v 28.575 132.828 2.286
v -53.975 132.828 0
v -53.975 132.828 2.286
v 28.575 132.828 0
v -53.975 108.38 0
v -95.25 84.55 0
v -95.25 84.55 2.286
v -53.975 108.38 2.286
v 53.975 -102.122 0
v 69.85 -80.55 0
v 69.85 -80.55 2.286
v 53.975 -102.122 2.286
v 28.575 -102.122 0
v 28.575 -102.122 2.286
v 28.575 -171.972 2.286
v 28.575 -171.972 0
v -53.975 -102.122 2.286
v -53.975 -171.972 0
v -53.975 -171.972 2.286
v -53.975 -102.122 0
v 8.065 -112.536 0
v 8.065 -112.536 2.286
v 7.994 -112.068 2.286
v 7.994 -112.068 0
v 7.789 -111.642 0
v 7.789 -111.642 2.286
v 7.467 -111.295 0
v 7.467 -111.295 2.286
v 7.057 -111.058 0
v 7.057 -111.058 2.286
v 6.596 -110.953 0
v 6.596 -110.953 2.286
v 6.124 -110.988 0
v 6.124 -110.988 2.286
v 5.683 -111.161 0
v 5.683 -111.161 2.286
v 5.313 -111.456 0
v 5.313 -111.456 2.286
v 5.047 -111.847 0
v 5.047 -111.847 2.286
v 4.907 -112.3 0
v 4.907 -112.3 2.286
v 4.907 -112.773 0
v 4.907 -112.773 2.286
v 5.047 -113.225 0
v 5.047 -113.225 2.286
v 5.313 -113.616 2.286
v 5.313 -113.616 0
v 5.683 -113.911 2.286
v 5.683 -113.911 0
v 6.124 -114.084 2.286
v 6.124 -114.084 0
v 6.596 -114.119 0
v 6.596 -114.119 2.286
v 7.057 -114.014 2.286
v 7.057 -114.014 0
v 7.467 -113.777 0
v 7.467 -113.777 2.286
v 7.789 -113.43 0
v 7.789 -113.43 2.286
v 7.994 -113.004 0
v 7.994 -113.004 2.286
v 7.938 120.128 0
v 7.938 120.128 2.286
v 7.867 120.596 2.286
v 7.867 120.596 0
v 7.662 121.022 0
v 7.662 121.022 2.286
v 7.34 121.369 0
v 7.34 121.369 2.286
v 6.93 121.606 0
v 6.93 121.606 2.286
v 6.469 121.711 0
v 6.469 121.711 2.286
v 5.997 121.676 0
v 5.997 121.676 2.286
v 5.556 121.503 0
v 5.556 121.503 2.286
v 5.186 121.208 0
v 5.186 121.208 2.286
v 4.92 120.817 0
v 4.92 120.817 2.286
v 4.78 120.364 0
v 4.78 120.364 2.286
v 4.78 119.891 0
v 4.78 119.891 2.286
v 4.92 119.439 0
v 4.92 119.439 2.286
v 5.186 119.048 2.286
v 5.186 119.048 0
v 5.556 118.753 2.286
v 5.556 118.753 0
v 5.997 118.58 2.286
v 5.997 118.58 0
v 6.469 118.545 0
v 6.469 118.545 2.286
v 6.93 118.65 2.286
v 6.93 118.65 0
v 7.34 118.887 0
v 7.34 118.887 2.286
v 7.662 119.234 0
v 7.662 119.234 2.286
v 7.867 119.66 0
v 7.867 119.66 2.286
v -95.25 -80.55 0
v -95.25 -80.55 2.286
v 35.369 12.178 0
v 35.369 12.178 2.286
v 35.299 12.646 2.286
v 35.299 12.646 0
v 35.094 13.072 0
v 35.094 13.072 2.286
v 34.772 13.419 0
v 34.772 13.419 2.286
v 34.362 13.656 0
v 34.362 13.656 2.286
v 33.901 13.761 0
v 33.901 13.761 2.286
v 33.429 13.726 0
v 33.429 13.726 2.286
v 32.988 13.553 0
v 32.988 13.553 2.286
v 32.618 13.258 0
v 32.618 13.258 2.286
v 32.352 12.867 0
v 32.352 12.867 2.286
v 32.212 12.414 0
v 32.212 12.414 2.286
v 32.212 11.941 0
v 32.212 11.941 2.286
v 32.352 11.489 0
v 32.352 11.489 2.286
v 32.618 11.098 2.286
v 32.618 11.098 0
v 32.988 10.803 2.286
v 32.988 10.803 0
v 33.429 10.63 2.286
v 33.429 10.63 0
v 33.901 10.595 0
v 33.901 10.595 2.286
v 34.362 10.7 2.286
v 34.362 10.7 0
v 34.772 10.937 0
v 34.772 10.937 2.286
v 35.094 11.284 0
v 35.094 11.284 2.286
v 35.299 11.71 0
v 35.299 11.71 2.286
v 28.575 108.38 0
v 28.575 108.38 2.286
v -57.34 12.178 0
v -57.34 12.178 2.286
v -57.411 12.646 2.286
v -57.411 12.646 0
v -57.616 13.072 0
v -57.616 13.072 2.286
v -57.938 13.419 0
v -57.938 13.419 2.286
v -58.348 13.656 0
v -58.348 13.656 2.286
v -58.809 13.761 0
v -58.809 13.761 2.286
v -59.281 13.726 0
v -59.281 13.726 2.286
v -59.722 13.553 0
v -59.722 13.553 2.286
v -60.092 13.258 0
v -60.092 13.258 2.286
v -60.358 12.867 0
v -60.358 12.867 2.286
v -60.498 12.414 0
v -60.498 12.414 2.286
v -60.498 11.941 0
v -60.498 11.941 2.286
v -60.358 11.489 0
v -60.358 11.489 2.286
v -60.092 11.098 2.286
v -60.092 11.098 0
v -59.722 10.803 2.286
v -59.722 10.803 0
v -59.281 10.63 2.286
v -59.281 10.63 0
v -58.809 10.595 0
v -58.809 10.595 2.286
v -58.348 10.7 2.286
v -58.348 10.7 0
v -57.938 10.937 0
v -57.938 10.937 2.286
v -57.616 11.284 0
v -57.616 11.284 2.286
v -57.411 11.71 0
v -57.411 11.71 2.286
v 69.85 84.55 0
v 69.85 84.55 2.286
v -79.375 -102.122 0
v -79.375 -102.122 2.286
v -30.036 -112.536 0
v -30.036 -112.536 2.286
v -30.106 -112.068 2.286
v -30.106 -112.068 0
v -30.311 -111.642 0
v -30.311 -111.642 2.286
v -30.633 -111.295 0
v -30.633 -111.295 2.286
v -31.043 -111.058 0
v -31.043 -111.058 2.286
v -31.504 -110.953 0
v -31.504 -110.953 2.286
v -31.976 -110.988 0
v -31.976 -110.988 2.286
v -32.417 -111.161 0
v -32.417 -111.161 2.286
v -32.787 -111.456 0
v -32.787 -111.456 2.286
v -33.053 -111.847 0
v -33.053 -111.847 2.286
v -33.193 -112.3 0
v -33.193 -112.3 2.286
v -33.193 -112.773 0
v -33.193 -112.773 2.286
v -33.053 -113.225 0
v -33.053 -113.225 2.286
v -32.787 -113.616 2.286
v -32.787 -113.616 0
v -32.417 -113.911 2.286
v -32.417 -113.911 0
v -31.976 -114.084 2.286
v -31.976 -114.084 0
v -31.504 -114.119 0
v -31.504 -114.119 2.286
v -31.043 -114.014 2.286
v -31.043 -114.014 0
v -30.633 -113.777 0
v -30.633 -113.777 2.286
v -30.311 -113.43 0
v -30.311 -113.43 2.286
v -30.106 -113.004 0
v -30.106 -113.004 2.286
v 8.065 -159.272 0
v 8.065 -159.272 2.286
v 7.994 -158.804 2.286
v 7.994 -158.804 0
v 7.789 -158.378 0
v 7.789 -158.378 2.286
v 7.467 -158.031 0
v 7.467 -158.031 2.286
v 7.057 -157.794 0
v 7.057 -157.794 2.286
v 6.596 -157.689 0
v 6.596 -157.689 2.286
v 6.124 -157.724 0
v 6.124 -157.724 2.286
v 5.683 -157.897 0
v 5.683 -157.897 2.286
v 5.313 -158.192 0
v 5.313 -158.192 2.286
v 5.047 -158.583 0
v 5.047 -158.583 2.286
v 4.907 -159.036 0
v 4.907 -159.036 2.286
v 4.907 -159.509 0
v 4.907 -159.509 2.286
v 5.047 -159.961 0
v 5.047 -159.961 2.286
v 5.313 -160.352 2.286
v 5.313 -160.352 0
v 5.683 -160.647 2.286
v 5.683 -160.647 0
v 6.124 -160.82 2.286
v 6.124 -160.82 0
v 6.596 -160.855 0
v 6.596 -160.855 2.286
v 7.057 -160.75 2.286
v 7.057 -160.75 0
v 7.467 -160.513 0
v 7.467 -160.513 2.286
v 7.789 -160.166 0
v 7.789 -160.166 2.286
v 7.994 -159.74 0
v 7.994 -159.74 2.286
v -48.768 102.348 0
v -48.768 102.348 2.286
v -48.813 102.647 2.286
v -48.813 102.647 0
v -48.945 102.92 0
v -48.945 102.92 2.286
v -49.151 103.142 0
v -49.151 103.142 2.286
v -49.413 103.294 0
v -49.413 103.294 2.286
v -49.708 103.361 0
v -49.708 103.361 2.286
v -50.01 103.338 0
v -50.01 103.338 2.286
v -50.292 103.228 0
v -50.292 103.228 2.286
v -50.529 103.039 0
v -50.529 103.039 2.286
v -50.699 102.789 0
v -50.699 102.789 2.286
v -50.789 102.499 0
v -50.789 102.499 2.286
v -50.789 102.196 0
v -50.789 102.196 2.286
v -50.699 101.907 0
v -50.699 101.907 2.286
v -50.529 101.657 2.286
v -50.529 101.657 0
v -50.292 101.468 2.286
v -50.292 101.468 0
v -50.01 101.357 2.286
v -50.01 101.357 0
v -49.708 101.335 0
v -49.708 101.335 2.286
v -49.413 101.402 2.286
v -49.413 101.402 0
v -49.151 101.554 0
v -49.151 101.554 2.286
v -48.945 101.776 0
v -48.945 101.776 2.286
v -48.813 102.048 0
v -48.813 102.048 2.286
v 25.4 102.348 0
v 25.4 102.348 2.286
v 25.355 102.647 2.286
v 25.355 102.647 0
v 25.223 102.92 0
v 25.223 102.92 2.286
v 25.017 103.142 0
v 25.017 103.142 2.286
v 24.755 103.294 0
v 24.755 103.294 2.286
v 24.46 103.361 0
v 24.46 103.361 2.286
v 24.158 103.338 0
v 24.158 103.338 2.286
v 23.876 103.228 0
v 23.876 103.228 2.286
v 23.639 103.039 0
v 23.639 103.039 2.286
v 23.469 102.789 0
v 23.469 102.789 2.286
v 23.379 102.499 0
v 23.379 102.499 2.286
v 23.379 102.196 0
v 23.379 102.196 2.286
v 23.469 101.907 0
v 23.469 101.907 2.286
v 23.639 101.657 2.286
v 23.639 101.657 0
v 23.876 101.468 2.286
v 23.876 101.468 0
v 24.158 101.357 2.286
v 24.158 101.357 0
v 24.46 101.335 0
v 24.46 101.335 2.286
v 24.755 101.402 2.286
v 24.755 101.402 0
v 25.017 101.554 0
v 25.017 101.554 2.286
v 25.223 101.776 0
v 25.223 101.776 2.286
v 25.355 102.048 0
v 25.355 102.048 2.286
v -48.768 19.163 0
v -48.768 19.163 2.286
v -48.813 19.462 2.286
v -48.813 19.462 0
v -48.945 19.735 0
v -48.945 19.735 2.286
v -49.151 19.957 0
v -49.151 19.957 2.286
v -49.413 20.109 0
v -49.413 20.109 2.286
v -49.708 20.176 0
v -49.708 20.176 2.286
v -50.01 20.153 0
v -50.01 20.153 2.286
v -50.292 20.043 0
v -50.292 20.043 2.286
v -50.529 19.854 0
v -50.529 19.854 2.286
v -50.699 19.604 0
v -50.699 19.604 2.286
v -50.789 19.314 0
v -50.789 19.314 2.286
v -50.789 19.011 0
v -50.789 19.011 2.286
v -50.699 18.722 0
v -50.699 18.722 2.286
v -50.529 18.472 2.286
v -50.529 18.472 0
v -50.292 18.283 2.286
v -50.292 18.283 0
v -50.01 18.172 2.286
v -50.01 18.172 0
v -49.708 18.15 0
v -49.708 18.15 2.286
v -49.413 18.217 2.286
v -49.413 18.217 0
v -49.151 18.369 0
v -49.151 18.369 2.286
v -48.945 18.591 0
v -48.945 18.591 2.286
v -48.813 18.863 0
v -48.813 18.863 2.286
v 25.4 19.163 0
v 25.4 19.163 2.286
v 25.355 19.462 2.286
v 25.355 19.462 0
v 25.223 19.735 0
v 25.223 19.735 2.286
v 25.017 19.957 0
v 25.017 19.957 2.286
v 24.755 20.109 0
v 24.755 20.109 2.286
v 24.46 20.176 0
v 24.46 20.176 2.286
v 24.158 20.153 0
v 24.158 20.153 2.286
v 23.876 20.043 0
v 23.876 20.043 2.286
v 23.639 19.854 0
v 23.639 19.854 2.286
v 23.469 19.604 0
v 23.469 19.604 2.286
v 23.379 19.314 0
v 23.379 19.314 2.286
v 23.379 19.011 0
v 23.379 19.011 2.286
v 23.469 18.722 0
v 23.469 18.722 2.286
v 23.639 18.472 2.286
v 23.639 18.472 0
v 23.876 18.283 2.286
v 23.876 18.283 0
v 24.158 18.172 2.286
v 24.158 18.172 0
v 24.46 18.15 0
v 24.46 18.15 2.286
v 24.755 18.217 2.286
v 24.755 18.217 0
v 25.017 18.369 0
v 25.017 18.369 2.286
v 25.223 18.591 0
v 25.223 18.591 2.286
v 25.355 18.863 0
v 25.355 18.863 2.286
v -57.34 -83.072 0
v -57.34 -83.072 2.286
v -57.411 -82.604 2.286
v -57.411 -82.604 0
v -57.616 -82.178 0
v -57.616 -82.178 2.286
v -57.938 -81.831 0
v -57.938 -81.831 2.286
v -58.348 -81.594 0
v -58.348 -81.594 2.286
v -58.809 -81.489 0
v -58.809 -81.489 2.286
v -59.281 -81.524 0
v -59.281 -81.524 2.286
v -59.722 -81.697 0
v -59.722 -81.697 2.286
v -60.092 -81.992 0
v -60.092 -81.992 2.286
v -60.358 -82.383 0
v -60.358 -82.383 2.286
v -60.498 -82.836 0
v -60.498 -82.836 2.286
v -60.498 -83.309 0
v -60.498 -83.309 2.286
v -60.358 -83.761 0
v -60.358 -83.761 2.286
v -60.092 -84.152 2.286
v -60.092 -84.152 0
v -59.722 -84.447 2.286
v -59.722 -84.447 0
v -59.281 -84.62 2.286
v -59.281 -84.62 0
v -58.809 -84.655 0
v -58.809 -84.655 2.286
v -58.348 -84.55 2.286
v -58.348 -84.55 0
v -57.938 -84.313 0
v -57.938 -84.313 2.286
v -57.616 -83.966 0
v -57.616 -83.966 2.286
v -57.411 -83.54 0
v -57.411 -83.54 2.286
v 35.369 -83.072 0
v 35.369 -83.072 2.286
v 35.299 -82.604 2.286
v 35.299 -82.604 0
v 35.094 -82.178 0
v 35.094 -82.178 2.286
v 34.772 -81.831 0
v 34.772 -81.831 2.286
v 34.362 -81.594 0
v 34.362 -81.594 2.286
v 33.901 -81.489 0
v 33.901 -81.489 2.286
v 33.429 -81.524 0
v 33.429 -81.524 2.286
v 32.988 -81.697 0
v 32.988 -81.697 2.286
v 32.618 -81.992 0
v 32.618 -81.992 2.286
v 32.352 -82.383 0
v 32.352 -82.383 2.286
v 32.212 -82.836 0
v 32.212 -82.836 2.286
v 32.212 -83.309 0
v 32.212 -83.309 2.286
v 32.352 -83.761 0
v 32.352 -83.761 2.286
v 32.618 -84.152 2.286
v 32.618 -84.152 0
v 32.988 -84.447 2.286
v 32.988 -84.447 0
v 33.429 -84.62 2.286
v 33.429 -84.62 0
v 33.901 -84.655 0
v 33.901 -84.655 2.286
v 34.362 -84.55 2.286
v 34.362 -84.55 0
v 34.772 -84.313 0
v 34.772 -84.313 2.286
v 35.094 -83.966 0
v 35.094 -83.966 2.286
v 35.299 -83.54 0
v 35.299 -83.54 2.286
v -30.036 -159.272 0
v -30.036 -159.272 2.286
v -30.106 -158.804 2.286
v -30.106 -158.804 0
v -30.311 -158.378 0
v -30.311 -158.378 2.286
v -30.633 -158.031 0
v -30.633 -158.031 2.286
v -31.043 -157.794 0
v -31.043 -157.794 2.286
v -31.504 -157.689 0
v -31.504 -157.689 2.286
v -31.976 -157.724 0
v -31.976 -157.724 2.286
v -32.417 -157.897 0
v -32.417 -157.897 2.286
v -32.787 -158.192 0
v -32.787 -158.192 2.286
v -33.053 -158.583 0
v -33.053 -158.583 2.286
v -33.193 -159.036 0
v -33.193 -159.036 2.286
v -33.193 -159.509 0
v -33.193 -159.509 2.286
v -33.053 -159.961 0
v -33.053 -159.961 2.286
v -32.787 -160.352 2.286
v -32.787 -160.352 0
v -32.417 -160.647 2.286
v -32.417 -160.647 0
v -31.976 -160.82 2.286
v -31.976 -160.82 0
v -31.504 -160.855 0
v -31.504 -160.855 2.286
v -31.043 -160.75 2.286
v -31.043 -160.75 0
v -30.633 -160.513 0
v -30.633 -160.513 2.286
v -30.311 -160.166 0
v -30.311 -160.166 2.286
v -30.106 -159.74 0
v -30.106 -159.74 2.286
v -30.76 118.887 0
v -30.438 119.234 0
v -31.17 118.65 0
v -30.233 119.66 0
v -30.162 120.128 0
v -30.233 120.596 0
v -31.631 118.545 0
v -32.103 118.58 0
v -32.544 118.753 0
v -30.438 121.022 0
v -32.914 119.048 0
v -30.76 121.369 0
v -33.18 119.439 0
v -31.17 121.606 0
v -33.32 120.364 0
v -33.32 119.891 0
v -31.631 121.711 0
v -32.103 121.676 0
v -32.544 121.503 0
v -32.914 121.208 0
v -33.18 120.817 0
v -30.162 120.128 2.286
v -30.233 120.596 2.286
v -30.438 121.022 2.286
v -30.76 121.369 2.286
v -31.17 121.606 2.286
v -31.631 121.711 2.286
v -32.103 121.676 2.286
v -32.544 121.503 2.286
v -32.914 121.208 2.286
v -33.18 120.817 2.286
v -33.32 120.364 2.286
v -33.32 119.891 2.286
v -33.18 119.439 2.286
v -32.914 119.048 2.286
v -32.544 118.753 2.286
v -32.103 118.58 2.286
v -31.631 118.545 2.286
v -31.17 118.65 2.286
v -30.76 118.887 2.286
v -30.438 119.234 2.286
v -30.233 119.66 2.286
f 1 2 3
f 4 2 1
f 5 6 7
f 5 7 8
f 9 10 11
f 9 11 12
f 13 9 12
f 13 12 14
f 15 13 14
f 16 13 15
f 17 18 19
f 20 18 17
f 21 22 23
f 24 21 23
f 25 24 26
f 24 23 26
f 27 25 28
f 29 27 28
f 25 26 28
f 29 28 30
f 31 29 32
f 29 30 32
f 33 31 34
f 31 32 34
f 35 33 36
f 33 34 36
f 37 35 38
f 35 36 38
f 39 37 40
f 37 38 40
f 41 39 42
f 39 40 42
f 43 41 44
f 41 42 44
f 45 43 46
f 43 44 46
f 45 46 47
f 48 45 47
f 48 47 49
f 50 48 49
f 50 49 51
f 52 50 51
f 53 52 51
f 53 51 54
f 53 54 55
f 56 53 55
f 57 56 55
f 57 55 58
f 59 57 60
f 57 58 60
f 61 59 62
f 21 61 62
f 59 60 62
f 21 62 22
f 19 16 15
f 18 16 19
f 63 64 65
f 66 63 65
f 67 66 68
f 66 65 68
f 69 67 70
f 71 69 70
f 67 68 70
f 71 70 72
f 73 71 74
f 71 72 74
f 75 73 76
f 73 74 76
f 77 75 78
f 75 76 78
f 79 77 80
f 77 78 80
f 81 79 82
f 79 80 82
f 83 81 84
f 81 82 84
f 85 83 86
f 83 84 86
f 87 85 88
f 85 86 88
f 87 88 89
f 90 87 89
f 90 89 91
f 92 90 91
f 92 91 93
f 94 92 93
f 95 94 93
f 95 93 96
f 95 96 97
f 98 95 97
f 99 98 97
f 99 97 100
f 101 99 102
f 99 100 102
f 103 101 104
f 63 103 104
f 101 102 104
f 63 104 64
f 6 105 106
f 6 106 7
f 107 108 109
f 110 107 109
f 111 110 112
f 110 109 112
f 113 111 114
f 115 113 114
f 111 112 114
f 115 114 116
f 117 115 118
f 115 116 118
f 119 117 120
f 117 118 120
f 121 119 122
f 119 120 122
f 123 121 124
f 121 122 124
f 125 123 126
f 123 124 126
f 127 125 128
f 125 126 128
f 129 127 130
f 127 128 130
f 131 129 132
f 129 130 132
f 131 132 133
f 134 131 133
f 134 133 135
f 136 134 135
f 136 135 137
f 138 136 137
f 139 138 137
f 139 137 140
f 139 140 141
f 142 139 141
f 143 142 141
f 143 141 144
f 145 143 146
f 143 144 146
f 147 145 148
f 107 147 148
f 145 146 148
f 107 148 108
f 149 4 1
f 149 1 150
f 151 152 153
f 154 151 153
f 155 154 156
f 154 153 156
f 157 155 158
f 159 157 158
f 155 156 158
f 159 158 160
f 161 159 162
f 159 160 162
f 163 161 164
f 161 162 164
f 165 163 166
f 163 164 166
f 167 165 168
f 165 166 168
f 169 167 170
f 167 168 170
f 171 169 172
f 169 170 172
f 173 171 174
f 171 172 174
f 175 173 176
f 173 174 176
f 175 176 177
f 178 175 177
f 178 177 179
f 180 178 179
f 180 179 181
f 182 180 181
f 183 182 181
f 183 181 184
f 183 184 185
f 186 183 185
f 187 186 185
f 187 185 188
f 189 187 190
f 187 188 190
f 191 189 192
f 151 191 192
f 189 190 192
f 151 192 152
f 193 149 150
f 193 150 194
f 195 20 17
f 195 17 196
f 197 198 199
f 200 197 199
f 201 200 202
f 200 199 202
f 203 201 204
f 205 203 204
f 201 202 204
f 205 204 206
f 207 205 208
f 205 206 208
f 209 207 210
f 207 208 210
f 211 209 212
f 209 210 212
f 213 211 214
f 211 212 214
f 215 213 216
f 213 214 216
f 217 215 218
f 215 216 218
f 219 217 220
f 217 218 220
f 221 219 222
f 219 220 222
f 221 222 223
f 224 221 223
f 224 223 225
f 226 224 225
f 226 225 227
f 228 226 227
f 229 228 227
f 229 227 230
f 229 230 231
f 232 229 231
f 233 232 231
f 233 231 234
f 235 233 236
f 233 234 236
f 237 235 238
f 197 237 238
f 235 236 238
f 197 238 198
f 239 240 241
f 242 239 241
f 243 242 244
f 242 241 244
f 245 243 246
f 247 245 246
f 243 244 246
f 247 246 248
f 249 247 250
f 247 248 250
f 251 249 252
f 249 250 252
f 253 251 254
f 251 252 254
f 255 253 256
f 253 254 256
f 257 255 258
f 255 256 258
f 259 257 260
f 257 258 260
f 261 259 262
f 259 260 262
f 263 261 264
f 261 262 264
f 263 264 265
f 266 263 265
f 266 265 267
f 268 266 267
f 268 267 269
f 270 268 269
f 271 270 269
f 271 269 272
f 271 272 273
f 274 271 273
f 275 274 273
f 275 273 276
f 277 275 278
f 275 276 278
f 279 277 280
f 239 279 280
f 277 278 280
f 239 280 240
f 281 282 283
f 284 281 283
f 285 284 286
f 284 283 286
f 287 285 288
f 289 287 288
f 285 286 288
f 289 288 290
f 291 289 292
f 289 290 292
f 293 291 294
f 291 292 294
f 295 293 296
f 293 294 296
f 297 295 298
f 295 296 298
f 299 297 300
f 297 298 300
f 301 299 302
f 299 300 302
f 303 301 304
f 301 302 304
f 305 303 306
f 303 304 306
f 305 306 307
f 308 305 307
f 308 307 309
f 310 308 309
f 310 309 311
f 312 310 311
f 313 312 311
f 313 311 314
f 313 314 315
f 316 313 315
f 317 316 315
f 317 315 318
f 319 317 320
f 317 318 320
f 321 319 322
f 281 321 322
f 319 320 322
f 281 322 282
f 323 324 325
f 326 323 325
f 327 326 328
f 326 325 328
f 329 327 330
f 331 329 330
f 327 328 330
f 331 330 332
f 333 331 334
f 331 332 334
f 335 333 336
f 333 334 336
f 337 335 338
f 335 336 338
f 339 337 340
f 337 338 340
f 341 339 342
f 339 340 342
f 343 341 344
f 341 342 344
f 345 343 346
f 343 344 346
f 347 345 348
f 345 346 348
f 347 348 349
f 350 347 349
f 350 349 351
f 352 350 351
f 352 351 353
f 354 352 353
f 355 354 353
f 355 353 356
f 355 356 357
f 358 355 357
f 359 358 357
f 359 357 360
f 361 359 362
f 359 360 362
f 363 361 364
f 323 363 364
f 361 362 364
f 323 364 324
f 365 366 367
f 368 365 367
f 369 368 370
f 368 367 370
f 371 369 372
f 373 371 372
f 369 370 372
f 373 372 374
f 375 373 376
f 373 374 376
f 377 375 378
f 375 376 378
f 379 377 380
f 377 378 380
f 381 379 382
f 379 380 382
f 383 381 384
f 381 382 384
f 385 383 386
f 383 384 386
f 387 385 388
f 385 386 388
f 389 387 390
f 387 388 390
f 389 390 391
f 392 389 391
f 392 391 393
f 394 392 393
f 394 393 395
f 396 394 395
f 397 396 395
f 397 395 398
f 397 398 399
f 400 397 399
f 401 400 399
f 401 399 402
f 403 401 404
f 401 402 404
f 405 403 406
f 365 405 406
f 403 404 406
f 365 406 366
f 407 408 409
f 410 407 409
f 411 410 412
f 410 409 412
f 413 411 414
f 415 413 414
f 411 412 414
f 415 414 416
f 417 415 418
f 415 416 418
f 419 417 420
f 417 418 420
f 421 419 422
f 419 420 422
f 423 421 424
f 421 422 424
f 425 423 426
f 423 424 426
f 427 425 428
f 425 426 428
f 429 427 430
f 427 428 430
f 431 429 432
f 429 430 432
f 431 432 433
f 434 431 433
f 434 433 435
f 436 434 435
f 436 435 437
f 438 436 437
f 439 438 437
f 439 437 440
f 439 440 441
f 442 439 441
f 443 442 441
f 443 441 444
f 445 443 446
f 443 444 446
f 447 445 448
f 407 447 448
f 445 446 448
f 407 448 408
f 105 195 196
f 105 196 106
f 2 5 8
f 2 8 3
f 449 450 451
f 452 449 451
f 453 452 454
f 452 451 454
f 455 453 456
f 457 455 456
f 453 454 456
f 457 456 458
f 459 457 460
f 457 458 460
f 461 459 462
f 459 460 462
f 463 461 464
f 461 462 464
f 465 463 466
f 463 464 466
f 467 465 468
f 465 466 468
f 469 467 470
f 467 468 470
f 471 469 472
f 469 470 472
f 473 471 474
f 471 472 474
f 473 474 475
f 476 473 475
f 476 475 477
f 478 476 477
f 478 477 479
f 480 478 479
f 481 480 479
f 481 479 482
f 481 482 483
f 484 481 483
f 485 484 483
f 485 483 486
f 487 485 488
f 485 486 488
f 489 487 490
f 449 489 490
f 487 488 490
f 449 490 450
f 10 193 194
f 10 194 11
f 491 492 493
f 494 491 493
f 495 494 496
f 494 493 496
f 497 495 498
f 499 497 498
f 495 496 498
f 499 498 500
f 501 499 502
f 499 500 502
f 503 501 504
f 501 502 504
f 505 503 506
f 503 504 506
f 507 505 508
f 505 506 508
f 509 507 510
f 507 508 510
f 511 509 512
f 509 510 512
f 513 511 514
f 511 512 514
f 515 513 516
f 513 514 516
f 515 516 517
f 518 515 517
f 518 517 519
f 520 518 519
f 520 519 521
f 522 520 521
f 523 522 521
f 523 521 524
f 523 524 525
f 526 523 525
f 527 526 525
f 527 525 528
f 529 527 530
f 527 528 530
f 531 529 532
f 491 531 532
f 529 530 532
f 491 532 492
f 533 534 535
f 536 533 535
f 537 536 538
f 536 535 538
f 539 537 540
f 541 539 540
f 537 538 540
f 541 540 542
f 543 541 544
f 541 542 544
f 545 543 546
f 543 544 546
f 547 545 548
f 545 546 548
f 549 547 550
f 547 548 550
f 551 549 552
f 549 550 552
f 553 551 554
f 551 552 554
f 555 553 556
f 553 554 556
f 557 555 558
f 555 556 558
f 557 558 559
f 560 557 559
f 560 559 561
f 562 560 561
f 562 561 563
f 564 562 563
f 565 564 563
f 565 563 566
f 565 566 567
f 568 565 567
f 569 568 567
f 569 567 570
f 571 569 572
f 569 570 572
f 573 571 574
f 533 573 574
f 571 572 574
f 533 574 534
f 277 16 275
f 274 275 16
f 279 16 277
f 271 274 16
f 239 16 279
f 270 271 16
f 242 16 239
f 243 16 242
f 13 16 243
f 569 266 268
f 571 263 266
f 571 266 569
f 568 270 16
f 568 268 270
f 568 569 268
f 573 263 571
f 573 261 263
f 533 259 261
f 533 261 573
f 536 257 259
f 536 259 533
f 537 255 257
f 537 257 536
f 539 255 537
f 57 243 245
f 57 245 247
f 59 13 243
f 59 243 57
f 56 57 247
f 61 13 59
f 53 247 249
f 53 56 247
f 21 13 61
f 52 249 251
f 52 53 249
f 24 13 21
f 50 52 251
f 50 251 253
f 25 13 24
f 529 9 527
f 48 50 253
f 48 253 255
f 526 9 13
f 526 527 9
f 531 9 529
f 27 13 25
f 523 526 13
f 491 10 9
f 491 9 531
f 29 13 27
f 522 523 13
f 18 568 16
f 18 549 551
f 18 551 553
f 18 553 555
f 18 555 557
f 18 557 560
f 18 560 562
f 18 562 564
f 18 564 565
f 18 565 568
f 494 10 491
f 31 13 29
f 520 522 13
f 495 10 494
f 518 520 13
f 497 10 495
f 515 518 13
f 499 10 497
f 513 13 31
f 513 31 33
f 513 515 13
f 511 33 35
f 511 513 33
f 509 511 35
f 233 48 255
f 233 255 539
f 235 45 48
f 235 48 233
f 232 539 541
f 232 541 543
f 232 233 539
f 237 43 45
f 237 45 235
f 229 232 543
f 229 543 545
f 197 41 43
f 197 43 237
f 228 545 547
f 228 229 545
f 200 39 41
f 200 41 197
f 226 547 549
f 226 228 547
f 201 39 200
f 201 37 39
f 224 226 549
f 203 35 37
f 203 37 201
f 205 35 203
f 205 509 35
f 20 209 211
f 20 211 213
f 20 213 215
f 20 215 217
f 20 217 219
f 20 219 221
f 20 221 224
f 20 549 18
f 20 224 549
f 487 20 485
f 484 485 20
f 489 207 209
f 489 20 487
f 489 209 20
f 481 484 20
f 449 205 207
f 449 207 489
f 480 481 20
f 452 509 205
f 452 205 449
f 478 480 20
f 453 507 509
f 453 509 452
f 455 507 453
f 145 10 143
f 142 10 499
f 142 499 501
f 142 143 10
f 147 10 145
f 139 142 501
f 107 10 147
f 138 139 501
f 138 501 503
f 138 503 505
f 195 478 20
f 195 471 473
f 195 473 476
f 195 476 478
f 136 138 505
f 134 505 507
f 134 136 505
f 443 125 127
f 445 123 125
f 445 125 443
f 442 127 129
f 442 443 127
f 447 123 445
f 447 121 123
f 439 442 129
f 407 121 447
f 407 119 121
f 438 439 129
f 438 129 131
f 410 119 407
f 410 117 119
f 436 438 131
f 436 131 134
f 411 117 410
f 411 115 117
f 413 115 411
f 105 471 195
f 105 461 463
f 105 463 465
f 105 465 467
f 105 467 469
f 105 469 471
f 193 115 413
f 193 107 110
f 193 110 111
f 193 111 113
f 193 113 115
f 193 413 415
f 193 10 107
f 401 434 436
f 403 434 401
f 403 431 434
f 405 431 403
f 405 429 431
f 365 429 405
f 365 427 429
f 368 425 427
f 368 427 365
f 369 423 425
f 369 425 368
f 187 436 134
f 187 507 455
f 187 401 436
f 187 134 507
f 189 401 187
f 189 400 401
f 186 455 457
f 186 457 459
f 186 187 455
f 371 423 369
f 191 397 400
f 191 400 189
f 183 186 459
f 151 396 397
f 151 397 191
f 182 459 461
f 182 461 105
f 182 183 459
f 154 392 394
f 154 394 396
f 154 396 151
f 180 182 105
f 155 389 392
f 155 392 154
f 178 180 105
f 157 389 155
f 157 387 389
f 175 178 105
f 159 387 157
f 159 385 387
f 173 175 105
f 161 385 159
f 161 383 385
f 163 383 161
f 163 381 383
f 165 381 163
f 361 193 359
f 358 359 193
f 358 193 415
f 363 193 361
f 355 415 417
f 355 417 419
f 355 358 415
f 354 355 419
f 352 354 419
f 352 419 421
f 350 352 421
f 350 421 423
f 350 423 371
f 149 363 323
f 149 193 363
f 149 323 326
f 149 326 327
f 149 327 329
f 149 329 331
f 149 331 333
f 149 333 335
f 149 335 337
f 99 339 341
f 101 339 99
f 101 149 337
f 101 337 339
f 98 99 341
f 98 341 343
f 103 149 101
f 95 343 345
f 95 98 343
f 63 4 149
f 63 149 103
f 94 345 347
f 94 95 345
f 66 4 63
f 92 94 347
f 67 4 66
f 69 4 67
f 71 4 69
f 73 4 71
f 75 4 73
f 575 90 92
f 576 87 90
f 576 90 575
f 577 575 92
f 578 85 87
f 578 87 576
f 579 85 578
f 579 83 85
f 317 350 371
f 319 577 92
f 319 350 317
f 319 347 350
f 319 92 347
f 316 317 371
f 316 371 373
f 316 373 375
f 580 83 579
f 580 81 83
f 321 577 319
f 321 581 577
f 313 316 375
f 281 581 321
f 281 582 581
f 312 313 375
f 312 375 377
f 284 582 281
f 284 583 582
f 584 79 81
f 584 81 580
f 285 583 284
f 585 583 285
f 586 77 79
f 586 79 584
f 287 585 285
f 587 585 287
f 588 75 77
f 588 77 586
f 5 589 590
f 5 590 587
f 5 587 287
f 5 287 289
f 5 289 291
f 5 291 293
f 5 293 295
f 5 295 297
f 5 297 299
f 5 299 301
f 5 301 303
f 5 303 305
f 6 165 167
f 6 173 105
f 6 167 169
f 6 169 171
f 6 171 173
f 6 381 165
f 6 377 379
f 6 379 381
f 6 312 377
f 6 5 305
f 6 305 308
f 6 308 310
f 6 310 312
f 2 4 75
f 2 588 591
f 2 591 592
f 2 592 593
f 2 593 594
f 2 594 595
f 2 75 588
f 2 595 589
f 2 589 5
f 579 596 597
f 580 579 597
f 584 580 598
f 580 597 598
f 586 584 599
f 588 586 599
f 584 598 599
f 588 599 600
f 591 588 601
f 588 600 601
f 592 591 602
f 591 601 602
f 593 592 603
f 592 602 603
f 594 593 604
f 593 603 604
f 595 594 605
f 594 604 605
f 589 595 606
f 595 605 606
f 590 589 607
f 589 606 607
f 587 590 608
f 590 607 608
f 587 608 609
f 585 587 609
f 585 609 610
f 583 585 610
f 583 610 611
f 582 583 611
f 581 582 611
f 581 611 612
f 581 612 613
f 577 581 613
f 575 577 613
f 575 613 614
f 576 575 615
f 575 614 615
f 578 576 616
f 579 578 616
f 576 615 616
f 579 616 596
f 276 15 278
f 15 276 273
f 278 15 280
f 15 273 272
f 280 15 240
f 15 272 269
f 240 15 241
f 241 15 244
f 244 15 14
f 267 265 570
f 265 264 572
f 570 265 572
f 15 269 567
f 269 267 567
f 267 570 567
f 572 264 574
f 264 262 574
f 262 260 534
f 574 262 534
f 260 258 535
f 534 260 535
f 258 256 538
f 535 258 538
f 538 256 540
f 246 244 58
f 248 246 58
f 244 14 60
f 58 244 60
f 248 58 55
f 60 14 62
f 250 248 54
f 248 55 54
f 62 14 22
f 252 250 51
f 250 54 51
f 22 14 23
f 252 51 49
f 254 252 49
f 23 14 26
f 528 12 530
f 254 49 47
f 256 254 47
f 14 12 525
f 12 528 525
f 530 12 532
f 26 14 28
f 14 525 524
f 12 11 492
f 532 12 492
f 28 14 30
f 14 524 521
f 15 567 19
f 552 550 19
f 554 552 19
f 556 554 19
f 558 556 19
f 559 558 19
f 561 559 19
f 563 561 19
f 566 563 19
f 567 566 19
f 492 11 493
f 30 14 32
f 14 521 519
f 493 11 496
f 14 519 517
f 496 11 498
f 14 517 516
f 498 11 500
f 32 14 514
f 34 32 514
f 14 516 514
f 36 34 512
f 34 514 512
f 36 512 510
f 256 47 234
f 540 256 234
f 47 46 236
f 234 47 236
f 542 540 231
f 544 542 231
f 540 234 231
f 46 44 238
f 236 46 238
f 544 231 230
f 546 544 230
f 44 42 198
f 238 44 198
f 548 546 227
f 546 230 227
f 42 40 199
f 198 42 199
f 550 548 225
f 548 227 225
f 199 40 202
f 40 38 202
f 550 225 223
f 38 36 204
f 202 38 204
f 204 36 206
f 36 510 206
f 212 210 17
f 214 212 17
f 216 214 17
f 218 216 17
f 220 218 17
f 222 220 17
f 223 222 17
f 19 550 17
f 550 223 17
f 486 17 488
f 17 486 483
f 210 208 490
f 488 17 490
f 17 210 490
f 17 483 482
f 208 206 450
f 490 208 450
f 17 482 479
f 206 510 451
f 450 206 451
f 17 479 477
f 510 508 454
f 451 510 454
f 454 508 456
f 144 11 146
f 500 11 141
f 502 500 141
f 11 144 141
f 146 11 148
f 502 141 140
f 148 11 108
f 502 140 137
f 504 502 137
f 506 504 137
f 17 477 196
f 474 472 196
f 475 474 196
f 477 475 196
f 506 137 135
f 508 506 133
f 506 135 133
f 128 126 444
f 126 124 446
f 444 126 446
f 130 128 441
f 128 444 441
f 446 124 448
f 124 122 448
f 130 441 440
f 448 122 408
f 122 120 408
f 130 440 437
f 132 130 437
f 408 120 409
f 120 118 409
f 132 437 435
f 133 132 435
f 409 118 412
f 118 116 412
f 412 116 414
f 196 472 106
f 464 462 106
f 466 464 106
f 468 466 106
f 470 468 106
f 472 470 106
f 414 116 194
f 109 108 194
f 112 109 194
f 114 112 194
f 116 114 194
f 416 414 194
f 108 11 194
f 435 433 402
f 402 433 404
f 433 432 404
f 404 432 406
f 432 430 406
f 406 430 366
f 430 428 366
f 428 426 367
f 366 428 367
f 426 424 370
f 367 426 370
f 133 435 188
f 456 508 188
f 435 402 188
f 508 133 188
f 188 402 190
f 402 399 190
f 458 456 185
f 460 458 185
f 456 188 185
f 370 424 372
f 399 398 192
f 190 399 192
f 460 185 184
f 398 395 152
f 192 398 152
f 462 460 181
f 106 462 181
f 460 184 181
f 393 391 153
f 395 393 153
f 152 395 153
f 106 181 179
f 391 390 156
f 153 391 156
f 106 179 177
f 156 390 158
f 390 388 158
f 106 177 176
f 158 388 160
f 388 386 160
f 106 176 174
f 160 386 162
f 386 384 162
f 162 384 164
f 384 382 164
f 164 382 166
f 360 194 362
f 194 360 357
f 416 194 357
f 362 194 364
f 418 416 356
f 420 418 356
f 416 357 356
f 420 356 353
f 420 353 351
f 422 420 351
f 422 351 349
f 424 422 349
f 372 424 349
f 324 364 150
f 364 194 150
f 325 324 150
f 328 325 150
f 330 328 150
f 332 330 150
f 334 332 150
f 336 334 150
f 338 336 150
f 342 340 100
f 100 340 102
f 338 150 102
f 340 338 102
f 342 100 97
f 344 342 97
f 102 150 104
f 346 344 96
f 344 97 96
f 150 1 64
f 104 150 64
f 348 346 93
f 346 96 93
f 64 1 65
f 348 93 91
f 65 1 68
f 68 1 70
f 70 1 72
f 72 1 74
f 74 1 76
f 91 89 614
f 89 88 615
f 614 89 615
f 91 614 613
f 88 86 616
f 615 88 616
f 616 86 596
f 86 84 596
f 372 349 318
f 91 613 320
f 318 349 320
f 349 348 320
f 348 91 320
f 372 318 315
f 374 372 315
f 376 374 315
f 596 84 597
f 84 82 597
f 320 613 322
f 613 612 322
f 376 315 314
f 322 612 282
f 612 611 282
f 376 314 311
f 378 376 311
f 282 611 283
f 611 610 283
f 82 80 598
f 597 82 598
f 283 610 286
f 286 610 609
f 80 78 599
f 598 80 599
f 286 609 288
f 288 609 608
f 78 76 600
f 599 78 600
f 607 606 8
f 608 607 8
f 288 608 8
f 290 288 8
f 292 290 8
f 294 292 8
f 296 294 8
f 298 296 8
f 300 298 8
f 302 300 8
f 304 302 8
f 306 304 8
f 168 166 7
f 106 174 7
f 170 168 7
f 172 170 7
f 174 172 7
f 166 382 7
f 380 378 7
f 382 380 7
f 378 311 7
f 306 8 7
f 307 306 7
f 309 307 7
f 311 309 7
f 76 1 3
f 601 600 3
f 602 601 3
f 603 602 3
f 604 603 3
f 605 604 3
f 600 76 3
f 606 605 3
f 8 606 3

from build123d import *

# Parameters (mm, degrees)
BOSS_EXTRUDE1_DEPTH = 2.286
SKETCH18_R          = 1.5875
SKETCH18_R_2        = 1.016
CUT_EXTRUDE1_DEPTH  = 2.286


with BuildPart() as part:
    # Sketch1 → Boss-Extrude1 (new body)
    with BuildSketch(Plane.XY):
        Polygon((28.575, 108.380382361), (69.85, 84.55025), (69.85, -80.54975), (53.975, -102.122117639), (28.575, -102.122117639), (28.575, -171.972117639), (-53.975, -171.972117639), (-53.975, -102.122117639), (-79.375, -102.122117639), (-95.25, -80.54975), (-95.25, 84.55025), (-53.975, 108.380382361), (-53.975, 132.827882361), (28.575, 132.827882361), align=None)
    extrude(amount=BOSS_EXTRUDE1_DEPTH)

    # Sketch18 → Cut-Extrude1 (cut)
    with BuildSketch(Plane.XY.offset(2.286)):
        with Locations((-31.623, -159.272117639)):
            Circle(SKETCH18_R)
        with Locations((6.477, -159.272117639)):
            Circle(SKETCH18_R)
        with Locations((-31.75, 120.127882361)):
            Circle(SKETCH18_R)
        with Locations((6.35, 120.127882361)):
            Circle(SKETCH18_R)
        with Locations((-58.928, -83.072117639)):
            Circle(SKETCH18_R)
        with Locations((33.782, -83.072117639)):
            Circle(SKETCH18_R)
        with Locations((-58.928, 12.177882361)):
            Circle(SKETCH18_R)
        with Locations((33.782, 12.177882361)):
            Circle(SKETCH18_R)
        with Locations((-31.623, -112.536117639)):
            Circle(SKETCH18_R)
        with Locations((6.477, -112.536117639)):
            Circle(SKETCH18_R)
        with Locations((-49.784, 102.347882361)):
            Circle(SKETCH18_R_2)
        with Locations((24.384, 102.347882361)):
            Circle(SKETCH18_R_2)
        with Locations((-49.784, 19.162882361)):
            Circle(SKETCH18_R_2)
        with Locations((24.384, 19.162882361)):
            Circle(SKETCH18_R_2)
    extrude(amount=-CUT_EXTRUDE1_DEPTH, mode=Mode.SUBTRACT)


solid = part.part
